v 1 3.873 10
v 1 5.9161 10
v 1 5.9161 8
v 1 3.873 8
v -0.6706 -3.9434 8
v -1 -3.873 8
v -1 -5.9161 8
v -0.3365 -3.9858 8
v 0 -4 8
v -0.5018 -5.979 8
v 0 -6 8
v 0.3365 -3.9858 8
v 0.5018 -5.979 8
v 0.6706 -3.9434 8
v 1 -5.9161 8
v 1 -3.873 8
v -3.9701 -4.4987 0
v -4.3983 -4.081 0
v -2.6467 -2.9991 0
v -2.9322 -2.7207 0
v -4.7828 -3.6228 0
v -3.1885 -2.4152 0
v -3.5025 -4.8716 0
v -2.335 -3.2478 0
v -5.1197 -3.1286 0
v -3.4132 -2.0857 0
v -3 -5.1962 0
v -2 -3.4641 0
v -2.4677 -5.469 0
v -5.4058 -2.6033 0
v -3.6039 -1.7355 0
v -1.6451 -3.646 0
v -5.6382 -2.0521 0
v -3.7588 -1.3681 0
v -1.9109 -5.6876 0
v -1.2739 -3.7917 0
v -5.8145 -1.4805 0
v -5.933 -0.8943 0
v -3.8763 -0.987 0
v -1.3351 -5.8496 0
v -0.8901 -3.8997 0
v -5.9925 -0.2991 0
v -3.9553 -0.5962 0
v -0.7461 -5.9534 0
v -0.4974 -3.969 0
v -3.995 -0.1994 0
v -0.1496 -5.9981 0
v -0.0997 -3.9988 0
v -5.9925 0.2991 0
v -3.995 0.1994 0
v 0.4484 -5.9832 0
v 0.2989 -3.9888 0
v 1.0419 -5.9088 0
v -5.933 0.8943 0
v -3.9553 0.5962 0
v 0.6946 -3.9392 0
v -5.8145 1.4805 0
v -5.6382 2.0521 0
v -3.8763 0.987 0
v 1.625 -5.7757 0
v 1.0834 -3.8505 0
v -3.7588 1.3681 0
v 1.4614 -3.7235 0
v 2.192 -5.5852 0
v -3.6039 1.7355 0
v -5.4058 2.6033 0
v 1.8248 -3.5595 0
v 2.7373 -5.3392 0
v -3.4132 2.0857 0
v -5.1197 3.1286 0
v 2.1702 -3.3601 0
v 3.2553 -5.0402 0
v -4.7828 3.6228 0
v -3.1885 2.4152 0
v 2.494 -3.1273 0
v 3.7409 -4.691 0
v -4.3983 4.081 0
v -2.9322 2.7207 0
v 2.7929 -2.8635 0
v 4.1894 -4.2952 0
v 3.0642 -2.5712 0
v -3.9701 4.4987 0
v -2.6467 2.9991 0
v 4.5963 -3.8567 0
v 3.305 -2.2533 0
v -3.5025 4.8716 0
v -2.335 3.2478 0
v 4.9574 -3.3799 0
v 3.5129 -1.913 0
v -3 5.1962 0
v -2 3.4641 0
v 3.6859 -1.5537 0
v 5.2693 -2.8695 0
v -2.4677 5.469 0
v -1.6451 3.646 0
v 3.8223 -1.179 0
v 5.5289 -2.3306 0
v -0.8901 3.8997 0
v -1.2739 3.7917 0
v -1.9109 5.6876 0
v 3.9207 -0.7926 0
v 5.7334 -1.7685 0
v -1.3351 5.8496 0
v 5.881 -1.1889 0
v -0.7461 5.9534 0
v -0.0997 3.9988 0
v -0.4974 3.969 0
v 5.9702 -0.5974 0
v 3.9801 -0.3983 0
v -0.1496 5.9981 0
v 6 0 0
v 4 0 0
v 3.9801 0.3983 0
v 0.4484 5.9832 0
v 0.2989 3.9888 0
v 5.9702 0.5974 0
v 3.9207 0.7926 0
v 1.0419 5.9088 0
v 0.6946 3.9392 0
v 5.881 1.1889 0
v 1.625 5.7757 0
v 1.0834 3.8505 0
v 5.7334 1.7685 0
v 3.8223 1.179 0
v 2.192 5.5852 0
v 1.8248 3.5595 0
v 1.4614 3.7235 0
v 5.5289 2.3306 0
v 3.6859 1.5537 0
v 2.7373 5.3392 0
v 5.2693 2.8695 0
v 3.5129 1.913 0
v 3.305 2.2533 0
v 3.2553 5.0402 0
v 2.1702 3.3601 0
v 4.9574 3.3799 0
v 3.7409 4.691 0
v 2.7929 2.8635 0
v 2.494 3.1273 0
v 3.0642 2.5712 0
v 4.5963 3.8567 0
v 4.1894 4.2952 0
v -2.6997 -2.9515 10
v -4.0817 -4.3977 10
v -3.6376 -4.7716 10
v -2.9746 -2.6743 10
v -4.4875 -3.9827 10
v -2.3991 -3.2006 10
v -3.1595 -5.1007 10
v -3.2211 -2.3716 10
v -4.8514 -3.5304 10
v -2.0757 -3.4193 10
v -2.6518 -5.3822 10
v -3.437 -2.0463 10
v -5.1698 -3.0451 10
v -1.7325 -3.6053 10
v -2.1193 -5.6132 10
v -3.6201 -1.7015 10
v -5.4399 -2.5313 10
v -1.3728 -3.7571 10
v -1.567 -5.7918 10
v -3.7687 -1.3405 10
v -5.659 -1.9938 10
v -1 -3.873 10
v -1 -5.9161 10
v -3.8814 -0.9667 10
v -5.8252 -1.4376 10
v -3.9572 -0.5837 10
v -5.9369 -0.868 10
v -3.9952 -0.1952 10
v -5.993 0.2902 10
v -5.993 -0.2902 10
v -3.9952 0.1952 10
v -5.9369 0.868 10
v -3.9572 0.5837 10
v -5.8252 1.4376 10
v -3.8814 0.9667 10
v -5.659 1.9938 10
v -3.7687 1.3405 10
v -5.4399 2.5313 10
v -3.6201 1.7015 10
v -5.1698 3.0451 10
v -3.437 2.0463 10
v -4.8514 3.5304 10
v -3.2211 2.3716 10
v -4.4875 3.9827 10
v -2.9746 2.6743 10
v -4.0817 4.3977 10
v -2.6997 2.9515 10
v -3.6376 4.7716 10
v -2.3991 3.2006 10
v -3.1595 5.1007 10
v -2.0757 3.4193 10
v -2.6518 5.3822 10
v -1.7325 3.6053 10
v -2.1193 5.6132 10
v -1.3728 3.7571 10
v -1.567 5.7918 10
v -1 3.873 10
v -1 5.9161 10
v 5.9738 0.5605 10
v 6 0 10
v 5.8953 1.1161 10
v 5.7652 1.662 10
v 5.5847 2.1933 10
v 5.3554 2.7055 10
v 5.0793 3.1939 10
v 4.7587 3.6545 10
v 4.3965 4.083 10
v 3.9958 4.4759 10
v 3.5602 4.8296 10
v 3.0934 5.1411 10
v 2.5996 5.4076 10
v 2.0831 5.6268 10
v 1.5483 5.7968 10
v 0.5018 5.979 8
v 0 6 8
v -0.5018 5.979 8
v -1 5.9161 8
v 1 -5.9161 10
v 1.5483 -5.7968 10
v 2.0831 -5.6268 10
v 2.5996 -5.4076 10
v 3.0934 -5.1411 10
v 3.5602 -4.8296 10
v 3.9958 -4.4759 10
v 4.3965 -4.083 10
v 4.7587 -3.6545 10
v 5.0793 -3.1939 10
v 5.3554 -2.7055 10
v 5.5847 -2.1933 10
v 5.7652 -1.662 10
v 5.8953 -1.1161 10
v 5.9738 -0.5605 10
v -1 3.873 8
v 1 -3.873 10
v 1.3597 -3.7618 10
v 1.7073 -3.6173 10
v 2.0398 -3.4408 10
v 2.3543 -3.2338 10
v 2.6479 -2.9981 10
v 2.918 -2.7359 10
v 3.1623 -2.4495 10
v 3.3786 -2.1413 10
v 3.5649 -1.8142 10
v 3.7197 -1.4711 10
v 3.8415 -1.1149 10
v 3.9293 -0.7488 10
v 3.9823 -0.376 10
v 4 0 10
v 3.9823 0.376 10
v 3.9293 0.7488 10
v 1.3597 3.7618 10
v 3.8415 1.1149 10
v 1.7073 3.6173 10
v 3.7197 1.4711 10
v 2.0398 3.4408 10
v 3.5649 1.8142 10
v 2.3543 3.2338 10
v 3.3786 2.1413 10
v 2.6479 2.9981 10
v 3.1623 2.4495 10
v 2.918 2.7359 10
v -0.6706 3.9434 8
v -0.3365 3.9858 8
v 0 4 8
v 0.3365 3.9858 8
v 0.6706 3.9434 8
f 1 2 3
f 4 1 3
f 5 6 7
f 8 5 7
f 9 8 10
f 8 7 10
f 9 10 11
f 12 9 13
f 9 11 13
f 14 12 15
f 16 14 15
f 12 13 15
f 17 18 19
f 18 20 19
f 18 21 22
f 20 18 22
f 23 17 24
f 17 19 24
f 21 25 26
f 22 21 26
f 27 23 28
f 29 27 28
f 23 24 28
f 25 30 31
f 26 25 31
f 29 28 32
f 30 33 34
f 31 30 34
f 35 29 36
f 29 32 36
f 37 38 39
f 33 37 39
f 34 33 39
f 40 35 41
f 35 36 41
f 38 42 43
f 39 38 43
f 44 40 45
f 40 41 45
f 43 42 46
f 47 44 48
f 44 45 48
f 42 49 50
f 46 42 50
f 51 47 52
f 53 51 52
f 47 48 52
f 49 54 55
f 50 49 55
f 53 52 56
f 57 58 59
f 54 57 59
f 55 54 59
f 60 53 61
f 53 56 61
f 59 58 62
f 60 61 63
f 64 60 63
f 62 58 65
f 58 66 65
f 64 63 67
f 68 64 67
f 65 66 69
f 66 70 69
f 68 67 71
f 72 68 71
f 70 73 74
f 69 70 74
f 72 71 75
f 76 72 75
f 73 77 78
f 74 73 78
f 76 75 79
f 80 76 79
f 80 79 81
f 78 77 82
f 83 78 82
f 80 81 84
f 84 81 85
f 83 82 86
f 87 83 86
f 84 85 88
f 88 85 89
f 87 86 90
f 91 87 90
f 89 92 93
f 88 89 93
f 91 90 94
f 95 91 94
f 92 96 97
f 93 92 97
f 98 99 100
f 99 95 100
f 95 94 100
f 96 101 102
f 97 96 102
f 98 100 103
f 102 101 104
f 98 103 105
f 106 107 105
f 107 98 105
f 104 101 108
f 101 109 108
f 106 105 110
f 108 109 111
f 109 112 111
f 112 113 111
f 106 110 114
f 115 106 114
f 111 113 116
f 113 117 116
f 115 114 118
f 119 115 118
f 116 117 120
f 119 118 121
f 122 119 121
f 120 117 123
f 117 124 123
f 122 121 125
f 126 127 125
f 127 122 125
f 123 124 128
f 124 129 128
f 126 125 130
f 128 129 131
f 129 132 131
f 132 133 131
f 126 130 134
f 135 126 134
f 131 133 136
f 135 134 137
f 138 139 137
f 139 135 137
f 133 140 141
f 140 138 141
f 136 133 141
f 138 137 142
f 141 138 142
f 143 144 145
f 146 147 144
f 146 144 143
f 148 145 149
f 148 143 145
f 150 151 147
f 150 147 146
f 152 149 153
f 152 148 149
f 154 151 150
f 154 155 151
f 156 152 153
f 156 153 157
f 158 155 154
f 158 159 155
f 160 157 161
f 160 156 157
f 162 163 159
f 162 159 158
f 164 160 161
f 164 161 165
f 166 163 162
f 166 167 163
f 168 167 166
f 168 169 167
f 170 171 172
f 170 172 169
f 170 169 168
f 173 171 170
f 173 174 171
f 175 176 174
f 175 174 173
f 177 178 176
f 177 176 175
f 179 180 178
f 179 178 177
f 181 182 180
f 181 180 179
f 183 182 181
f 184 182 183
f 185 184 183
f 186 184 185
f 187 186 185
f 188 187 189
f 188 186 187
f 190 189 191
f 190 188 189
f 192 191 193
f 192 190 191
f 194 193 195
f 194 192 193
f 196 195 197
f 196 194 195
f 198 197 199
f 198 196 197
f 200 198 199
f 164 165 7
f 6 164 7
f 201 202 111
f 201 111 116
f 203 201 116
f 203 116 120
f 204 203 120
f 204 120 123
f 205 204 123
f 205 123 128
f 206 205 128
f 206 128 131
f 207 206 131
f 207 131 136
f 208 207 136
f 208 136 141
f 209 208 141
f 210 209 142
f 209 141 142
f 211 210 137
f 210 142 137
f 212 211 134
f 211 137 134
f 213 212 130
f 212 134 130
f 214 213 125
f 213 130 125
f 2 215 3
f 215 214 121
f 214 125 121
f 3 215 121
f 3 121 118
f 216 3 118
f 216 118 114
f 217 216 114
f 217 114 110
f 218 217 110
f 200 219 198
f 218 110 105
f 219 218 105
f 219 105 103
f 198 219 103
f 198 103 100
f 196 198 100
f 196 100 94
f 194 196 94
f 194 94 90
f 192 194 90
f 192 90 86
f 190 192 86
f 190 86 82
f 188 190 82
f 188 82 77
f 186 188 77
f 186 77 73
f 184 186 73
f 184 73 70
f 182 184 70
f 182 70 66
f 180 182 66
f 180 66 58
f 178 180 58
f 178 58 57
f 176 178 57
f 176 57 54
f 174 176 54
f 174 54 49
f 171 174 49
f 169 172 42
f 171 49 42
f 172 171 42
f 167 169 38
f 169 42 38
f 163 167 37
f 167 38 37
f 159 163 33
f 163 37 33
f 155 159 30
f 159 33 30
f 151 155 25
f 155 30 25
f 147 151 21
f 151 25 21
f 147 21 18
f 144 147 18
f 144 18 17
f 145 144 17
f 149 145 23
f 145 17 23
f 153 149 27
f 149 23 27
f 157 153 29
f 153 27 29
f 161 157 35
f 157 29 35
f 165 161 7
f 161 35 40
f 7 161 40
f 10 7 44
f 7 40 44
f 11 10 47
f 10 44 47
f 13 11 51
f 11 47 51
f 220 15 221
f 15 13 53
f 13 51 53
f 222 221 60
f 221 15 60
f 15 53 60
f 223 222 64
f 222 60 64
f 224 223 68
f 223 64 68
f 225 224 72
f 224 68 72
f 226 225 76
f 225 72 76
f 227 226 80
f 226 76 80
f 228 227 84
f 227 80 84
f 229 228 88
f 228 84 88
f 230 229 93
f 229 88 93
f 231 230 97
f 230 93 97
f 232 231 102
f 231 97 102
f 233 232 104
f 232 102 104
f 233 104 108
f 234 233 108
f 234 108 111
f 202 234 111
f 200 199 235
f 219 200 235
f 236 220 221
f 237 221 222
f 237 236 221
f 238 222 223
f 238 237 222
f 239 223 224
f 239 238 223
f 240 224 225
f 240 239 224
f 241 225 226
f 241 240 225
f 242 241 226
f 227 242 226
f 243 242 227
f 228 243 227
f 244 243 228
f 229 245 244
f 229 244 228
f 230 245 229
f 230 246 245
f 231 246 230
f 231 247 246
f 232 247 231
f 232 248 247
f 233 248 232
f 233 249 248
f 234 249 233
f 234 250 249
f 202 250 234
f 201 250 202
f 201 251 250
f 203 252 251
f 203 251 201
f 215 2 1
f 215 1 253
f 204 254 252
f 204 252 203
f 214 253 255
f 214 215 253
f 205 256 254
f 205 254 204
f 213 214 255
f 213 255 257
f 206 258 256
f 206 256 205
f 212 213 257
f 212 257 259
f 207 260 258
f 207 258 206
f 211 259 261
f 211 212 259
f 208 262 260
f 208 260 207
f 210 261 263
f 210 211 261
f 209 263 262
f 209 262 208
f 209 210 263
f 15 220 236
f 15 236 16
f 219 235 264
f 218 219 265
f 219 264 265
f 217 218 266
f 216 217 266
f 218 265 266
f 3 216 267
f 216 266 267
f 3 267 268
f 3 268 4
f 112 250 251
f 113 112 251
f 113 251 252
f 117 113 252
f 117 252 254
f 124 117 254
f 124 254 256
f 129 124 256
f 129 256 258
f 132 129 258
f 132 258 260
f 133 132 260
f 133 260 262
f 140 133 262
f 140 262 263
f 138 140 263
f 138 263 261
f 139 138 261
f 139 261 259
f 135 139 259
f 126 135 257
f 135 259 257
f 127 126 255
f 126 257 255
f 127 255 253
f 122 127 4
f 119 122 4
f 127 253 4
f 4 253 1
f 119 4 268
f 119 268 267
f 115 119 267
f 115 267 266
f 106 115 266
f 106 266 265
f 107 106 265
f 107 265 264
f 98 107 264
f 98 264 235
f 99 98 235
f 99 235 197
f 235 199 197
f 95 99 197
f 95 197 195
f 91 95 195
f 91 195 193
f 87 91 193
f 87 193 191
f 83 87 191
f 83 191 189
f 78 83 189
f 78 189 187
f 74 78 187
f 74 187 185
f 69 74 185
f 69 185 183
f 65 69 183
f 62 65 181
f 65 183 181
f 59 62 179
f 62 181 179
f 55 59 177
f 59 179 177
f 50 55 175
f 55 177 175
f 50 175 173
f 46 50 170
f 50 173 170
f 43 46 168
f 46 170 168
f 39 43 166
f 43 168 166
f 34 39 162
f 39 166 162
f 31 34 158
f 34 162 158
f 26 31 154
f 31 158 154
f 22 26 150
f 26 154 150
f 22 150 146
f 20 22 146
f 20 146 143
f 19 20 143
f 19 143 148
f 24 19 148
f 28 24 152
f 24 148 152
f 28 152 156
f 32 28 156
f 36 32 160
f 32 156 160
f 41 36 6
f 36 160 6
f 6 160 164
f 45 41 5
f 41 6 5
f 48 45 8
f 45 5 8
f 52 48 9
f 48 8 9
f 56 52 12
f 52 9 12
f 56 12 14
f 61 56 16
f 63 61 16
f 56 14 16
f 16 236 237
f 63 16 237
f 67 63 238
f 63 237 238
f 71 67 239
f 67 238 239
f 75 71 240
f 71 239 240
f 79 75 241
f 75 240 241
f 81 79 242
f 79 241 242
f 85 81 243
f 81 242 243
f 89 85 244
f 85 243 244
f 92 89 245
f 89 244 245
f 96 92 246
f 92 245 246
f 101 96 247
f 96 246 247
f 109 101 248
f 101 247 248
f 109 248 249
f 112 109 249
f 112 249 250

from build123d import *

# Parameters (mm, degrees)
SKETCH1_R               = 6
BOSS_EXTRUDE1_DEPTH     = 10
SKETCH2_R               = 4
CUT_EXTRUDE1_DEPTH      = 14.114877049
CUT_EXTRUDE4_DEPTH      = 14.114877049
CUT_EXTRUDE4_DEPTH_BACK = 14.114877049
SKETCH3_W               = 2
SKETCH3_H               = 2


with BuildPart() as part:
    # Sketch1 → Boss-Extrude1 (new body)
    with BuildSketch(Plane.XY):
        Circle(SKETCH1_R)
    extrude(amount=BOSS_EXTRUDE1_DEPTH)

    # Sketch2 → Cut-Extrude1 (cut, through all)
    with BuildSketch(Plane.XY.offset(10)):
        Circle(SKETCH2_R)
    extrude(amount=-CUT_EXTRUDE1_DEPTH, mode=Mode.SUBTRACT)

    # Sketch3 → Cut-Extrude4 (cut, two sides: drawn at the far end of the back side and taken through both)
    with BuildSketch(Plane(origin=(0, 0, 0), x_dir=(1, 0, 0), z_dir=(0, 1, 0)).offset(-CUT_EXTRUDE4_DEPTH_BACK)):
        with Locations((0, -9)):
            Rectangle(SKETCH3_W, SKETCH3_H)
    extrude(amount=CUT_EXTRUDE4_DEPTH + CUT_EXTRUDE4_DEPTH_BACK, mode=Mode.SUBTRACT)


solid = part.part
